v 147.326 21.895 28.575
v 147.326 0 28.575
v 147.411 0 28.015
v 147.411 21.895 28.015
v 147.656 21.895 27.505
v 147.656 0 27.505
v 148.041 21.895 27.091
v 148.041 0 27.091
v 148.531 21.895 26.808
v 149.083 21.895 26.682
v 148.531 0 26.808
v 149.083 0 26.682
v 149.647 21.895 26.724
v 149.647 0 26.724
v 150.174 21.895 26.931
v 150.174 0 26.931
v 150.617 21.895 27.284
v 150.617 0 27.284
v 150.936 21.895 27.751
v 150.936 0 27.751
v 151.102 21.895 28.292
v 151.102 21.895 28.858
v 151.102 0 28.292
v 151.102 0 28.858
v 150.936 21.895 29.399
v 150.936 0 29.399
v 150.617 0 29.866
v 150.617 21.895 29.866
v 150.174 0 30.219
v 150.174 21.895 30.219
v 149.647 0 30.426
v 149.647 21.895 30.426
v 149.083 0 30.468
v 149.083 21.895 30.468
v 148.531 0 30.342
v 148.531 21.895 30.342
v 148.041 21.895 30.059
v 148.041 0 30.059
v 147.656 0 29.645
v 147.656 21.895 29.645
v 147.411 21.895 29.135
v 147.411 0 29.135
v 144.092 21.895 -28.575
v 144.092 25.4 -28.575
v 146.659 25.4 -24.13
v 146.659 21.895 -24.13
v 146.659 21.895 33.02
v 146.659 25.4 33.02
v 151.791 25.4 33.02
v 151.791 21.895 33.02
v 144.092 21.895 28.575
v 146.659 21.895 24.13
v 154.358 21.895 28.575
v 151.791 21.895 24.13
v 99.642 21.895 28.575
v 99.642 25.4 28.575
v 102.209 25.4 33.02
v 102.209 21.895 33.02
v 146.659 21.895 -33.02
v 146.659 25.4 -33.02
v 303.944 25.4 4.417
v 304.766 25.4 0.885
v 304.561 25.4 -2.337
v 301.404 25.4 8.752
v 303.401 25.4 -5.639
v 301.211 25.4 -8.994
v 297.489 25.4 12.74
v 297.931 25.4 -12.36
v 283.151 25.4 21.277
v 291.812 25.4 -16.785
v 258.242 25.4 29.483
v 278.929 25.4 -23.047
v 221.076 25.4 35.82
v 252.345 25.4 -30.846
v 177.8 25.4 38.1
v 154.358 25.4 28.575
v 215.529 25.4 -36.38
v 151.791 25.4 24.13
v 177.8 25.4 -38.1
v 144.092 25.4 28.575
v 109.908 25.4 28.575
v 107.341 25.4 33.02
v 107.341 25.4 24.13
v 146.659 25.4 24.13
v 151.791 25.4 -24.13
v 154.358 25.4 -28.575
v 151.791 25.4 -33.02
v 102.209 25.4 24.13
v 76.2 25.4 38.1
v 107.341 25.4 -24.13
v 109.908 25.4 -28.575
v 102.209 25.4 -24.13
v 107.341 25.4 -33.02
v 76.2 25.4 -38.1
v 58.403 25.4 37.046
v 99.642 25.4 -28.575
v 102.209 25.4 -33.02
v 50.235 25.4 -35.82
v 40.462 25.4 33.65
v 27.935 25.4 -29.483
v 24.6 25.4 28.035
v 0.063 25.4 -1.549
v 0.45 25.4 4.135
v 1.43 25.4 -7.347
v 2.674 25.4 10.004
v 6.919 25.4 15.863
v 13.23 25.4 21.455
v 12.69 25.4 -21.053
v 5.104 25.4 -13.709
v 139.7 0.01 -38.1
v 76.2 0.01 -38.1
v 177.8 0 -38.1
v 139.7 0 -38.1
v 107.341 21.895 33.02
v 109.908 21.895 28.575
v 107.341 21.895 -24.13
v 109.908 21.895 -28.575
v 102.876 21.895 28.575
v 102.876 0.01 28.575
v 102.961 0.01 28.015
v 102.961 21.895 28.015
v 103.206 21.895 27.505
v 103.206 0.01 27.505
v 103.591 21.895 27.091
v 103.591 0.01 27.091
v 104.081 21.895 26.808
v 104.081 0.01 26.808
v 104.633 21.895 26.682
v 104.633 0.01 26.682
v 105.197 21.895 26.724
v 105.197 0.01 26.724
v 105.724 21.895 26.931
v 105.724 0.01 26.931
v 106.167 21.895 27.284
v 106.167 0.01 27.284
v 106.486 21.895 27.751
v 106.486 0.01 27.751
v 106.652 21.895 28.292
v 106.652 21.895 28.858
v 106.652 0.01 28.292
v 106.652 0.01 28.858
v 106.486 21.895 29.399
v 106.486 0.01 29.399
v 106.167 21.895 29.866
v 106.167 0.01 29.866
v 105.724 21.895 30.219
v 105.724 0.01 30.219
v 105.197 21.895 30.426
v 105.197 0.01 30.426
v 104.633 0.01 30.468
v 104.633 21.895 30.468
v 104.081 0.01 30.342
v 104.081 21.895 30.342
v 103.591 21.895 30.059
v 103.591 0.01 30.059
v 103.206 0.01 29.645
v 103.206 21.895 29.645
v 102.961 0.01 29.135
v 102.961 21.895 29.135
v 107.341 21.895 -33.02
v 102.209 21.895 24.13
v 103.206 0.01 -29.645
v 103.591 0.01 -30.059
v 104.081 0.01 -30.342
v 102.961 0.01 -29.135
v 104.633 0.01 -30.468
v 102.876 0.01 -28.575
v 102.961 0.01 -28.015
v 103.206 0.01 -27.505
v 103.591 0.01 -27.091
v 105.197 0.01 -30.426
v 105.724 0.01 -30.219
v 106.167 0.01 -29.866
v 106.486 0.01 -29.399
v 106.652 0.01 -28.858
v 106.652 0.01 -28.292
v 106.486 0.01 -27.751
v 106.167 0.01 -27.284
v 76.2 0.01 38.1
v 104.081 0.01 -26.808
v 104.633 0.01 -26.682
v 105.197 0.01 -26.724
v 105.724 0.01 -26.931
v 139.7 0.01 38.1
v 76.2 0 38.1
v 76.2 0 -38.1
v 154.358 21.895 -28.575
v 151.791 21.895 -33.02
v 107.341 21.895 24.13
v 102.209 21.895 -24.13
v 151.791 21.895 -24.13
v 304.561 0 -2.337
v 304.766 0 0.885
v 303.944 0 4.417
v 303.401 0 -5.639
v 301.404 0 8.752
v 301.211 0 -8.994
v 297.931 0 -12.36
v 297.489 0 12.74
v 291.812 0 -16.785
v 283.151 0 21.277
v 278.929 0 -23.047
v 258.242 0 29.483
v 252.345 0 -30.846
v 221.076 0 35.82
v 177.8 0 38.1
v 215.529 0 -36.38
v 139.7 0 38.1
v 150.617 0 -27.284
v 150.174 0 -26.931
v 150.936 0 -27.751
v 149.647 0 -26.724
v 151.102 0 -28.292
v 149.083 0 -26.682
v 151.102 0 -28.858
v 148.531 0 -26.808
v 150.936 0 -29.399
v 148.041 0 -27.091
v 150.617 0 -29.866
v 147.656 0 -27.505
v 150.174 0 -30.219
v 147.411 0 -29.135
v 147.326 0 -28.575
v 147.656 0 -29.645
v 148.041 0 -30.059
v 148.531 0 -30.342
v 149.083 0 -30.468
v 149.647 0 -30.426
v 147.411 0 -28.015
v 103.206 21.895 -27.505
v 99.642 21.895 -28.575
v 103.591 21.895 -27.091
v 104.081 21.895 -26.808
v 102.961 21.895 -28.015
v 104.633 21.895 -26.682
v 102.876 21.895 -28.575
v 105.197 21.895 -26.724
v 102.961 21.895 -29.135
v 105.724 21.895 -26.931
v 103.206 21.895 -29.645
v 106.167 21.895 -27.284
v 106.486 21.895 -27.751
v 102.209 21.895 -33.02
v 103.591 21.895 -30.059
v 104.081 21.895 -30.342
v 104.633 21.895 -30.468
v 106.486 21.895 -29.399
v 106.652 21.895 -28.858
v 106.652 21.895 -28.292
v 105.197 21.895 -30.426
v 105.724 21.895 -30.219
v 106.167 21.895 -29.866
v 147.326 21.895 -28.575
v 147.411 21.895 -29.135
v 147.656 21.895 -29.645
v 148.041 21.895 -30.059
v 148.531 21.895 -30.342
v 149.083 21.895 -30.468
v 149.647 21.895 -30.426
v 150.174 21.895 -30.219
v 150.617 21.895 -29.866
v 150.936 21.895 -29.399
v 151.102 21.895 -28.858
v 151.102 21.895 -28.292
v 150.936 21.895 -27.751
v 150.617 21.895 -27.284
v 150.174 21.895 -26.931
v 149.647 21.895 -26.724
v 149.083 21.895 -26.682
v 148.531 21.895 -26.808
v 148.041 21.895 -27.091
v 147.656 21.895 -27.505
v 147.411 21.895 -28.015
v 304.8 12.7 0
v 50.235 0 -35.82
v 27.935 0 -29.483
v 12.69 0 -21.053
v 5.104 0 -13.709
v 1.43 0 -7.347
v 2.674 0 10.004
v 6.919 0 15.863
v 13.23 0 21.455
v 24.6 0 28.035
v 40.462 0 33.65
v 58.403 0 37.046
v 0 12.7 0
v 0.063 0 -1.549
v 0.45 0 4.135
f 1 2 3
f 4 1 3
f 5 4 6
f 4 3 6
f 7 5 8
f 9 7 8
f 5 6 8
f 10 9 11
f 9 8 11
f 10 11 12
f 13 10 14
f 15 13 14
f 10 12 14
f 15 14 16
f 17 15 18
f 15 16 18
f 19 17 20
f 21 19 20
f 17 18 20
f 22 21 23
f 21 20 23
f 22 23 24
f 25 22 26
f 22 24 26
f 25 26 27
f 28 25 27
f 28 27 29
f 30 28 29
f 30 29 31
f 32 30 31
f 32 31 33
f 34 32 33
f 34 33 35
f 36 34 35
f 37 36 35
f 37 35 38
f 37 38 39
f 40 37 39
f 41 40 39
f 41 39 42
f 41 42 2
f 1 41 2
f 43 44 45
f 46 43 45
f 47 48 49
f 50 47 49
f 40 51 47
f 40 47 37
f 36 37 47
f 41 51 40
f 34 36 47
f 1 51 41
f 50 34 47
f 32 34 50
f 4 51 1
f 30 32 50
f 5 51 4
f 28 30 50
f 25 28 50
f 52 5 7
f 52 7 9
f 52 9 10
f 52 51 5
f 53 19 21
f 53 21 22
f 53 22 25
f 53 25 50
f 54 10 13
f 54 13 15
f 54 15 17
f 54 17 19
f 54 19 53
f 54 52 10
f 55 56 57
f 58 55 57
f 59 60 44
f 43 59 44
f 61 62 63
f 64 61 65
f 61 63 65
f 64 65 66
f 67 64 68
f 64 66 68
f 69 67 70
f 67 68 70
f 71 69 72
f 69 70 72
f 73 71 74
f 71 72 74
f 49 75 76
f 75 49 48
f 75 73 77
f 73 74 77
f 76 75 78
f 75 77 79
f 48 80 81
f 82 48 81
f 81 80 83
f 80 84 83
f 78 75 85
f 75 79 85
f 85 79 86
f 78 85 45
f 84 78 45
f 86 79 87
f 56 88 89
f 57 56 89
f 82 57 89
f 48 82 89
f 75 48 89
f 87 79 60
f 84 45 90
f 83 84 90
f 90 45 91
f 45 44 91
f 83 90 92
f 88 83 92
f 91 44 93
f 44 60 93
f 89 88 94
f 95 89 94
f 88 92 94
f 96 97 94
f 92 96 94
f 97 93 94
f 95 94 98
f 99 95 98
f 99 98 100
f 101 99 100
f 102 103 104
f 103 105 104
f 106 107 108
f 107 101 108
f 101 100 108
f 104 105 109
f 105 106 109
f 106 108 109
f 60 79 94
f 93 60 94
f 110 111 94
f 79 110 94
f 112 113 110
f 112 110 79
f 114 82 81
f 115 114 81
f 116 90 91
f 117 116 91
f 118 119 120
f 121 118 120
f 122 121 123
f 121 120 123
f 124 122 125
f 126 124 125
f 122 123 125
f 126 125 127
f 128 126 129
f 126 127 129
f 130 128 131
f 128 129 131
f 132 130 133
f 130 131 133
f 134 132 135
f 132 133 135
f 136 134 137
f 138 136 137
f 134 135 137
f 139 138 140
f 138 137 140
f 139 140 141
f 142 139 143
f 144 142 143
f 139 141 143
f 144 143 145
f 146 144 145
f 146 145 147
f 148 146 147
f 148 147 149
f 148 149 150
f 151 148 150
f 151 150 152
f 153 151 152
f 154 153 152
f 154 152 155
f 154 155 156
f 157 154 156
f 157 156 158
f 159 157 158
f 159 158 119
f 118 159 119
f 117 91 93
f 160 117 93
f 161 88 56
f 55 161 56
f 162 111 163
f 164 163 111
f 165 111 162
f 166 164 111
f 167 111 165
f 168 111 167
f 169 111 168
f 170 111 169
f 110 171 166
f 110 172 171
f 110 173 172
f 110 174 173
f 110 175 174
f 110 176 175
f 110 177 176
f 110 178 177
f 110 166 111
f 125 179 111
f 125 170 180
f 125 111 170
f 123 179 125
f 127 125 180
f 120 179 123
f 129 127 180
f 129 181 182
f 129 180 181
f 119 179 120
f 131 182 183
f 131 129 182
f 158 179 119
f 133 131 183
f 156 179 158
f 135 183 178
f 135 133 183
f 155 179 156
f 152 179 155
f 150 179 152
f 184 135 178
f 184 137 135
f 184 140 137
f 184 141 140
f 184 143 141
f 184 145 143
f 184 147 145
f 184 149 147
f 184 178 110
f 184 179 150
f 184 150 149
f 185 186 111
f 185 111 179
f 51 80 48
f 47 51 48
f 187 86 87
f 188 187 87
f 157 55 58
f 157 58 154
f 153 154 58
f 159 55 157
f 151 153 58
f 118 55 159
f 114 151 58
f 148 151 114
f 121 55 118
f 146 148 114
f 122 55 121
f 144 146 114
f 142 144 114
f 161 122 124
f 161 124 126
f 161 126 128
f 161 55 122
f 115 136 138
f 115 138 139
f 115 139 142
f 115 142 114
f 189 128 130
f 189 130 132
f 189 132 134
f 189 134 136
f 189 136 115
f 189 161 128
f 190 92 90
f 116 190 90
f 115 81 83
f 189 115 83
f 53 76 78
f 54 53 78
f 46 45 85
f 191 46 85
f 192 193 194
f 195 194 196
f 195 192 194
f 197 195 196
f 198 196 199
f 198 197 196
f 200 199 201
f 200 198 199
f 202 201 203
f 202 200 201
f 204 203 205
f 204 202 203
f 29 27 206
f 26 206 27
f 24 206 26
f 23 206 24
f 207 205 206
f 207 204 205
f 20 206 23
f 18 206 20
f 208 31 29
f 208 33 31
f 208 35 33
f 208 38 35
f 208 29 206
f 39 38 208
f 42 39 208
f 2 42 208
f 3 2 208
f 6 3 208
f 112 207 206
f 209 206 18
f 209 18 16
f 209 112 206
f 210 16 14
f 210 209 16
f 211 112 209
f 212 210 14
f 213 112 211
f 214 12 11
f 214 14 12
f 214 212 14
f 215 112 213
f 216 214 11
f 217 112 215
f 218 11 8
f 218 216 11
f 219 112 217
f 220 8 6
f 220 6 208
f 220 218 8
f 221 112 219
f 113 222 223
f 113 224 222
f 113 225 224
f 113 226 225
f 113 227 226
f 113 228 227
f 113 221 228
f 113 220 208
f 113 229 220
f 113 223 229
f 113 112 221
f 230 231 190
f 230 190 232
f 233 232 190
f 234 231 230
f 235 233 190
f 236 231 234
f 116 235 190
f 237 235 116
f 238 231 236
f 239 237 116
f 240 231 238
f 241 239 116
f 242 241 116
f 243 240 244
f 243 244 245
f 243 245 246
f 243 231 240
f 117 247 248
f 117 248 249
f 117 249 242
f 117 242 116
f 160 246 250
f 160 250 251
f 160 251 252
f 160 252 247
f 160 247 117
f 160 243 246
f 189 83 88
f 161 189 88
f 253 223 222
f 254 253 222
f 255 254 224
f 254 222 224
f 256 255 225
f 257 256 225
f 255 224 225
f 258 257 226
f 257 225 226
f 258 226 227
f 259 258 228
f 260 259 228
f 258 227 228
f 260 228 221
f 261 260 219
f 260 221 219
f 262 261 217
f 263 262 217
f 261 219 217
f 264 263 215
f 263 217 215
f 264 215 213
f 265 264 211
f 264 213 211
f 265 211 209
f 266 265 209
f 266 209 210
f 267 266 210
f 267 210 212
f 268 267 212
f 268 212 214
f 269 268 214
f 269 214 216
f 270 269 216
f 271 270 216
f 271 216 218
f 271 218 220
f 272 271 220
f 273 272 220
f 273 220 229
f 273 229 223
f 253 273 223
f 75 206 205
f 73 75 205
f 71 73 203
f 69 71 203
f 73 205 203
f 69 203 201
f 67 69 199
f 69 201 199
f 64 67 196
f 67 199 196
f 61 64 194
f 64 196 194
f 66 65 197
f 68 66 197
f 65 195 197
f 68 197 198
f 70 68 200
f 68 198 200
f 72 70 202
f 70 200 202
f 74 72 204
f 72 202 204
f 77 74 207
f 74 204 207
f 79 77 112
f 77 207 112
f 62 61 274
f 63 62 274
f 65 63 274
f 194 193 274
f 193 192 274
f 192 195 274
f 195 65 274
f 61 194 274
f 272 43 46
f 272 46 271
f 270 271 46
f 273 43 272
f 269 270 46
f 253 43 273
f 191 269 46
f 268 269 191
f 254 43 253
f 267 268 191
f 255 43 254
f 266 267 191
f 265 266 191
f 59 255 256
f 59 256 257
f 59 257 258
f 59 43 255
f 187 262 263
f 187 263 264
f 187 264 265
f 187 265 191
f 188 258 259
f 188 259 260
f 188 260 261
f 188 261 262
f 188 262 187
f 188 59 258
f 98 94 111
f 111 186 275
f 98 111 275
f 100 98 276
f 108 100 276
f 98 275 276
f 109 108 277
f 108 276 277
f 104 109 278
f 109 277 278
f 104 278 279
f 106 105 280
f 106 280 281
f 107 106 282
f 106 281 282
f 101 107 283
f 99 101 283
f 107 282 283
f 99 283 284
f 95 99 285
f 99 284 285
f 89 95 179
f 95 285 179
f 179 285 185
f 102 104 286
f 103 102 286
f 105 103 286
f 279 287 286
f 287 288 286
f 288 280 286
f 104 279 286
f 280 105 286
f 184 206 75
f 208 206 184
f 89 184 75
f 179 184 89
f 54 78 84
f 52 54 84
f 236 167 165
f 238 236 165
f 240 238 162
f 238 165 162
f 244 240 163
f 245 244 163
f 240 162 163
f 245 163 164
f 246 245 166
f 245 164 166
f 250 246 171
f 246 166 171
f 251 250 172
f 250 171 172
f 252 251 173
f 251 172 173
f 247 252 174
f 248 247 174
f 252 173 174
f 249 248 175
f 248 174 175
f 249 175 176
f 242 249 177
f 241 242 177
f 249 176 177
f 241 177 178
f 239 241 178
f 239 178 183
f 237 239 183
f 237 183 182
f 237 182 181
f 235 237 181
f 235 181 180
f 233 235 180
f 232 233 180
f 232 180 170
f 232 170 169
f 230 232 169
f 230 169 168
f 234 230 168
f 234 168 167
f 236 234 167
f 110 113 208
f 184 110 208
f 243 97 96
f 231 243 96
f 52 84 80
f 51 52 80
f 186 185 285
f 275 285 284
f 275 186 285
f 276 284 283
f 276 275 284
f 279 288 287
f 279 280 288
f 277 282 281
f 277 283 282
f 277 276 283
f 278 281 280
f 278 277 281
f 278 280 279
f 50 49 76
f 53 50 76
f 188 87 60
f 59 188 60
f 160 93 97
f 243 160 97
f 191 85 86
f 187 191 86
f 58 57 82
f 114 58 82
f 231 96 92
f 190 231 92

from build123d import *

# Parameters (mm, degrees)
BOSS_EXTRUDE1_DEPTH   = 25.4
SKETCH4_W             = 63.5
SKETCH4_H             = 76.2
CUT_EXTRUDE4_DEPTH    = 0.01
F_6_CLEARANCE_HOLE1_D = 3.7973
CUT_EXTRUDE5_DEPTH    = 3.5052


with BuildPart() as part:
    # Sketch1 → Boss-Extrude1 (new body)
    with BuildSketch(Plane(origin=(0, 0, 0), x_dir=(1, 0, 0), z_dir=(0, 1, 0))):
        with BuildLine():
            Line((76.2, 38.1), (177.8, 38.1))
            add(Edge.make_bspline(
                [(177.8, -38.1), (304.8, -38.1), (304.8, 0), (304.8, 38.1), (177.8, 38.1)],
                knots=[4.71238898, 4.71238898, 4.71238898, 6.283185307, 6.283185307, 7.853981634, 7.853981634, 7.853981634], degree=2, weights=[1, 0.707106781, 1, 0.707106781, 1]))
            Line((177.8, -38.1), (76.2, -38.1))
            add(Edge.make_bspline(
                [(76.2, 38.1), (0, 38.1), (0, 0), (0, -38.1), (76.2, -38.1)],
                knots=[4.71238898, 4.71238898, 4.71238898, 6.283185307, 6.283185307, 7.853981634, 7.853981634, 7.853981634], degree=2, weights=[1, 0.707106781, 1, 0.707106781, 1]))
        make_face()
    extrude(amount=BOSS_EXTRUDE1_DEPTH)

    # Sketch4 → Cut-Extrude4 (cut)
    with BuildSketch(Plane.XZ):
        with Locations((107.95, 0)):
            Rectangle(SKETCH4_W, SKETCH4_H)
    extrude(amount=-CUT_EXTRUDE4_DEPTH, mode=Mode.SUBTRACT)

    # #6 Clearance Hole1 (through all)
    with Locations(Plane(origin=(0, 25.4, 0), x_dir=(1, 0, 0), z_dir=(0, 1, 0))):
        with Locations((104.775, 28.575), (149.225, 28.575), (149.225, -28.575), (104.775, -28.575)):
            Hole(F_6_CLEARANCE_HOLE1_D / 2)

    # Sketch7 → Cut-Extrude5 (cut)
    with BuildSketch(Plane(origin=(0, 25.4, 0), x_dir=(1, 0, 0), z_dir=(0, 1, 0))):
        Polygon((144.092356107, 28.575), (146.658678053, 24.13), (151.791321947, 24.13), (154.357643893, 28.575), (151.791321947, 33.02), (146.658678053, 33.02), align=None)
        Polygon((144.092356107, -28.575), (146.658678053, -33.02), (151.791321947, -33.02), (154.357643893, -28.575), (151.791321947, -24.13), (146.658678053, -24.13), align=None)
        Polygon((99.642356107, -28.575), (102.208678053, -33.02), (107.341321947, -33.02), (109.907643893, -28.575), (107.341321947, -24.13), (102.208678053, -24.13), align=None)
        Polygon((99.642356107, 28.575), (102.208678053, 24.13), (107.341321947, 24.13), (109.907643893, 28.575), (107.341321947, 33.02), (102.208678053, 33.02), align=None)
    extrude(amount=-CUT_EXTRUDE5_DEPTH, mode=Mode.SUBTRACT)


solid = part.part
